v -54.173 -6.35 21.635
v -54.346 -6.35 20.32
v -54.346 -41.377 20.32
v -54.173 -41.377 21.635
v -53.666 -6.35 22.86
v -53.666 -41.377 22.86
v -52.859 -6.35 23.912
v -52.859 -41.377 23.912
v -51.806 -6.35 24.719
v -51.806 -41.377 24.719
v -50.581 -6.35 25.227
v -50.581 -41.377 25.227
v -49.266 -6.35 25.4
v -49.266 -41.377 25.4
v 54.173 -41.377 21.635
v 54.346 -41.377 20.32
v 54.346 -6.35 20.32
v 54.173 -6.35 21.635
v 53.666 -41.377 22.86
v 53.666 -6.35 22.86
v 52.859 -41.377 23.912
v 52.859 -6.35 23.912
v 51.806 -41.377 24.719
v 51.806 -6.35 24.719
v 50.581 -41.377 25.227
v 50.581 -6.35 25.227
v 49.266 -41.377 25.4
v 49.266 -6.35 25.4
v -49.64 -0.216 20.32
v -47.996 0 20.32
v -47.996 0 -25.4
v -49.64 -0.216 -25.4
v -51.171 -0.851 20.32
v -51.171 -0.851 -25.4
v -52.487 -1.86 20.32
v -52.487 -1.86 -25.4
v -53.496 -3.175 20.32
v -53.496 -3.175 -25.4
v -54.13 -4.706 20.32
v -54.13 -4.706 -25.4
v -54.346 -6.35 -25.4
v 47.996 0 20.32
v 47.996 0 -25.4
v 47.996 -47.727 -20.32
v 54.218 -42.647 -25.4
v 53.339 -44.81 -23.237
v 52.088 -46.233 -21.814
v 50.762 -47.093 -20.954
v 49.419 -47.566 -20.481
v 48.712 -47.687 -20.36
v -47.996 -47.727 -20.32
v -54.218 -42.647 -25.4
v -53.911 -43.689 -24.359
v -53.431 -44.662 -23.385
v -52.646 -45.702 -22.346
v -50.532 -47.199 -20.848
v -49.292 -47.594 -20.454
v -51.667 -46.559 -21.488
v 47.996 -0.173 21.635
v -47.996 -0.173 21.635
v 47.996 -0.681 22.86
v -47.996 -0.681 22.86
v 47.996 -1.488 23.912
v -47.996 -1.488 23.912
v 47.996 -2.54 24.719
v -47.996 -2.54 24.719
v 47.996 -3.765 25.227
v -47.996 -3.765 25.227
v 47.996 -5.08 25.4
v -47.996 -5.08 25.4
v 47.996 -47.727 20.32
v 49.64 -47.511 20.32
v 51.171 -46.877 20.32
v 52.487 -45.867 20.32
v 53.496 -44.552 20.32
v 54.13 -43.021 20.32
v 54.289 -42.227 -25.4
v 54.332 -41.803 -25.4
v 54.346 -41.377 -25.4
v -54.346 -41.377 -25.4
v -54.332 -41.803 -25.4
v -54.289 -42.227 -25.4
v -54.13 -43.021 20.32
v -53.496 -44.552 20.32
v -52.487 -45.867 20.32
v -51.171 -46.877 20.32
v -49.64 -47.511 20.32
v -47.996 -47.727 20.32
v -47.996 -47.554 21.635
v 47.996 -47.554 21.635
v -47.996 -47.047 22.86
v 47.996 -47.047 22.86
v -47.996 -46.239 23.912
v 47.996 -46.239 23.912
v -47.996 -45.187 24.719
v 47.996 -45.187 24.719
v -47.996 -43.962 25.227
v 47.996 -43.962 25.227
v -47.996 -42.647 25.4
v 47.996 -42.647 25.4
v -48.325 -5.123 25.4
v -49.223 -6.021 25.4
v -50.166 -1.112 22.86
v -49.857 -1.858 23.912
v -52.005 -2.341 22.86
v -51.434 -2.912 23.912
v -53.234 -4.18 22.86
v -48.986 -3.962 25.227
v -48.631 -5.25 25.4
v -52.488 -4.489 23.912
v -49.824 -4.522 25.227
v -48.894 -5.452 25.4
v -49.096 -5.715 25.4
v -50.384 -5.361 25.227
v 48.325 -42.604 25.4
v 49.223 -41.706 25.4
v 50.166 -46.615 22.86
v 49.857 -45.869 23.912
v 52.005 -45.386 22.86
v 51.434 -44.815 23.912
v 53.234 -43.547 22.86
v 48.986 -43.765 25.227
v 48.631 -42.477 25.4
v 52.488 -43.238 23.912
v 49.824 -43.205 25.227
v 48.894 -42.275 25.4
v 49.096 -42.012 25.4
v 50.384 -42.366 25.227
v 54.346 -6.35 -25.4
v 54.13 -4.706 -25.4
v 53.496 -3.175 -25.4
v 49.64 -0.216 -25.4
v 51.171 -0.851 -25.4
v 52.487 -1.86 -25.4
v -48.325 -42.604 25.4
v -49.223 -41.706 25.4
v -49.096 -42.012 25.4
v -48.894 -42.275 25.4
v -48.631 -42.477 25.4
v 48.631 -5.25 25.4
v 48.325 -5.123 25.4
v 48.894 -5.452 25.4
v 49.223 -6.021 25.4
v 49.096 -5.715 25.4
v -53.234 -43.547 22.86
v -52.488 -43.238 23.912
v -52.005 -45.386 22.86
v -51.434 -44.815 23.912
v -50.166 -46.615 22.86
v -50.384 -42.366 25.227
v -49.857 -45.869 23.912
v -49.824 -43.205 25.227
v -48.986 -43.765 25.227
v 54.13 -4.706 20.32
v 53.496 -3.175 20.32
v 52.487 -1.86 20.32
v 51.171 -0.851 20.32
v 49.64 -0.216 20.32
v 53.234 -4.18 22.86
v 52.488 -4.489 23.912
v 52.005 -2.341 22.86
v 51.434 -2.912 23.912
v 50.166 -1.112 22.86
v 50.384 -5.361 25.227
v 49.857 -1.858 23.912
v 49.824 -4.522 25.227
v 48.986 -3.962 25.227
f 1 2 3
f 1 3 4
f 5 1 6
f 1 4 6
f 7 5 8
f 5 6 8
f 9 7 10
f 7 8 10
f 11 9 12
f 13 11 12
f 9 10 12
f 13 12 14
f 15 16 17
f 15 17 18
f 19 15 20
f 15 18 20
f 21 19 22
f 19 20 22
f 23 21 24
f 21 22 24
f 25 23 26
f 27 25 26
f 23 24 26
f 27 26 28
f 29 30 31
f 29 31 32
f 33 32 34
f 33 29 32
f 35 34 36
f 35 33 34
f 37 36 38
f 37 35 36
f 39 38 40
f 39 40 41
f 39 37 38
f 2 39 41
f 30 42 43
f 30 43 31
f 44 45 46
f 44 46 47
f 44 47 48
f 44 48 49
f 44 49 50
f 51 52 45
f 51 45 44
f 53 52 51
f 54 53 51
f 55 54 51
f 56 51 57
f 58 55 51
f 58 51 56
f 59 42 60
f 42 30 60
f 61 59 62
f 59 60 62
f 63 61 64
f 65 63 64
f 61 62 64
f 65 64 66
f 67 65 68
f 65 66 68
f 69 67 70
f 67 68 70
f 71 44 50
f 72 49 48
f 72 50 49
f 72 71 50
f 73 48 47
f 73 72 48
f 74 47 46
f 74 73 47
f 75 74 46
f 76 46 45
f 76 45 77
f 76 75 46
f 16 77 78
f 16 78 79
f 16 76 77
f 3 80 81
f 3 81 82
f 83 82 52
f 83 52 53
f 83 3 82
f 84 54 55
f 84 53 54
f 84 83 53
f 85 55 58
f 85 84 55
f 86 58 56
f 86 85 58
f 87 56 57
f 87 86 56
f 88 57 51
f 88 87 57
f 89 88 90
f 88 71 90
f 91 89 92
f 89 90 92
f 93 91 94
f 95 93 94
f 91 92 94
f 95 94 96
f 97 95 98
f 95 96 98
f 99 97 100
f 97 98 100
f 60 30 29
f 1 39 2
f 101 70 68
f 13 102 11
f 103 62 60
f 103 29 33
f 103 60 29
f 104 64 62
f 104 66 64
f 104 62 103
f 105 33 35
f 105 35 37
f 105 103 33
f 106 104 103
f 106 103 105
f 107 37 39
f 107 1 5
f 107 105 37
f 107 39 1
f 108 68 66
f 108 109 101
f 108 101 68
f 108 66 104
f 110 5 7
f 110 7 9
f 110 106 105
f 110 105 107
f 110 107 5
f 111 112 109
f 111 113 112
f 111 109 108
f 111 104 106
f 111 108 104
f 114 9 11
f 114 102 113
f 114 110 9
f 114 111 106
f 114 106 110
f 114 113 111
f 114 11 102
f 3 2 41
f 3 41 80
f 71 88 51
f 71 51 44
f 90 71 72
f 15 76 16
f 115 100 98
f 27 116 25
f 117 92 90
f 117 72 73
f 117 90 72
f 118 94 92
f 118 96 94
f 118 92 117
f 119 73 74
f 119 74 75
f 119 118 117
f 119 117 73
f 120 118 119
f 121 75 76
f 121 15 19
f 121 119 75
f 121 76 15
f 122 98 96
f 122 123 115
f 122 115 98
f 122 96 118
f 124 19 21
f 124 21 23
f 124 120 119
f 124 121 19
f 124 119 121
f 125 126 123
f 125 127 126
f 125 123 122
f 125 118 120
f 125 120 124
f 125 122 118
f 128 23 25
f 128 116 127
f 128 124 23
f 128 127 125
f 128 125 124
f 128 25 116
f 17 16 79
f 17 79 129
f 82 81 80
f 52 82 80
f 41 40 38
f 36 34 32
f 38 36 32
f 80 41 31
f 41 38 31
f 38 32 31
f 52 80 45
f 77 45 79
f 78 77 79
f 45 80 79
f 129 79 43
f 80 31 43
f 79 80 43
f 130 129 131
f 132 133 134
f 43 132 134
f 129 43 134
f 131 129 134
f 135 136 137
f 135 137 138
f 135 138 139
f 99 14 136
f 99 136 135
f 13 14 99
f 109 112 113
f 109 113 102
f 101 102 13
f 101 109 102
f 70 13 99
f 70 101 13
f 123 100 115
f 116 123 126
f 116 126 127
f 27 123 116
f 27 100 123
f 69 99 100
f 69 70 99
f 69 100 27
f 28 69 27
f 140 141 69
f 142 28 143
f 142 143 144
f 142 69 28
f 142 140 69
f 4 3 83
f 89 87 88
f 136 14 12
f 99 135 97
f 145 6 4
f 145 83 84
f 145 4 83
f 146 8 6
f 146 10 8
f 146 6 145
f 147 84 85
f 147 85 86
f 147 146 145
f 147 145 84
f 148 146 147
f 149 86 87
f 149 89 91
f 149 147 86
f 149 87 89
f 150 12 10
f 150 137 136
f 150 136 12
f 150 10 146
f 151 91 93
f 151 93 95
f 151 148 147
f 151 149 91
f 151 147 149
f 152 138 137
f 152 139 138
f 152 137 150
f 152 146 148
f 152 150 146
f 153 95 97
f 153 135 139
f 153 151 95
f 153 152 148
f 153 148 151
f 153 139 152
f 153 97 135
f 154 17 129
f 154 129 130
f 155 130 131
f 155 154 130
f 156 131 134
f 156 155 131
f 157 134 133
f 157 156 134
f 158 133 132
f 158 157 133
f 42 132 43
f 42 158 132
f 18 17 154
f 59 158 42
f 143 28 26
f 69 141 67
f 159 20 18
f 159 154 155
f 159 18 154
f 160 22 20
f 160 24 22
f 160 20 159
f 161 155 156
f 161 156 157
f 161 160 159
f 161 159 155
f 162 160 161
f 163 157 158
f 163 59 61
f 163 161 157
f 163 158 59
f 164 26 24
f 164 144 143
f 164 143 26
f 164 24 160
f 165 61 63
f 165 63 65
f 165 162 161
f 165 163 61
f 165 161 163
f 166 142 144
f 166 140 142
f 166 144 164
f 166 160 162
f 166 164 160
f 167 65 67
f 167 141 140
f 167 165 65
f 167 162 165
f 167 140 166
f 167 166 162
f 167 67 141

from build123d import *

# Parameters (mm, degrees)
F1_DEPTH      = 25.4
F1_DEPTH_BACK = 25.4
F2_R          = 5.08
F3_T1_DEPTH   = 122.1211277236


# Not quite as in the source:
# - a fillet or chamfer that OpenCascade refuses, or shapes differently, is made with other operations: its cross-section is extruded or revolved along the edge and cut away or added


with BuildPart() as f1:
    # F0 (on Top) → F1 (new body, two sides)
    with BuildSketch(Plane.XY) as f1_sk:
        with BuildLine():
            Line((47.9964142829, 0), (-47.9964142829, 0))
            ThreePointArc((-47.9964142829, 0), (-52.4865423435, -1.8598719395), (-54.3464142829, -6.35))
            Line((-54.3464142829, -6.35), (-54.3464142829, -41.3772979915))
            ThreePointArc((-54.3464142829, -41.3772979915), (-52.4865423435, -45.867426052), (-47.9964142829, -47.7272979915))
            Line((-47.9964142829, -47.7272979915), (47.9964142829, -47.7272979915))
            ThreePointArc((47.9964142829, -47.7272979915), (52.4865423435, -45.867426052), (54.3464142829, -41.3772979915))
            Line((54.3464142829, -41.3772979915), (54.3464142829, -6.35))
            ThreePointArc((54.3464142829, -6.35), (52.4865423435, -1.8598719395), (47.9964142829, 0))
        make_face()
    extrude(amount=F1_DEPTH)
    extrude(f1_sk.sketch, amount=-F1_DEPTH_BACK)

    # F2
    f2_edges = [f1.edges().sort_by_distance(p)[0] for p in [
        (0, -47.727298, 25.4),
        (54.346414, -23.863649, 25.4),
        (-52.486542, -45.867426, 25.4),
        (-54.346414, -23.863649, 25.4),
        (-52.486542, -1.859872, 25.4),
        (0, 0, 25.4),
        (52.486542, -1.859872, 25.4),
        (52.486542, -45.867426, 25.4),
    ]]
    fillet(f2_edges, radius=F2_R)

    # F3: chamfer of 5.08 on 1 edges, made by hand

    # F3_s2 → F3_t1 (cut)
    with BuildSketch(Plane.YZ.offset(-61.0605638618)):
        Polygon((-42.6472979915, -25.4), (-47.7272979915, -20.32), (-47.7272979915, -25.4), align=None)
    extrude(amount=F3_T1_DEPTH, mode=Mode.SUBTRACT)


solid = f1.part
